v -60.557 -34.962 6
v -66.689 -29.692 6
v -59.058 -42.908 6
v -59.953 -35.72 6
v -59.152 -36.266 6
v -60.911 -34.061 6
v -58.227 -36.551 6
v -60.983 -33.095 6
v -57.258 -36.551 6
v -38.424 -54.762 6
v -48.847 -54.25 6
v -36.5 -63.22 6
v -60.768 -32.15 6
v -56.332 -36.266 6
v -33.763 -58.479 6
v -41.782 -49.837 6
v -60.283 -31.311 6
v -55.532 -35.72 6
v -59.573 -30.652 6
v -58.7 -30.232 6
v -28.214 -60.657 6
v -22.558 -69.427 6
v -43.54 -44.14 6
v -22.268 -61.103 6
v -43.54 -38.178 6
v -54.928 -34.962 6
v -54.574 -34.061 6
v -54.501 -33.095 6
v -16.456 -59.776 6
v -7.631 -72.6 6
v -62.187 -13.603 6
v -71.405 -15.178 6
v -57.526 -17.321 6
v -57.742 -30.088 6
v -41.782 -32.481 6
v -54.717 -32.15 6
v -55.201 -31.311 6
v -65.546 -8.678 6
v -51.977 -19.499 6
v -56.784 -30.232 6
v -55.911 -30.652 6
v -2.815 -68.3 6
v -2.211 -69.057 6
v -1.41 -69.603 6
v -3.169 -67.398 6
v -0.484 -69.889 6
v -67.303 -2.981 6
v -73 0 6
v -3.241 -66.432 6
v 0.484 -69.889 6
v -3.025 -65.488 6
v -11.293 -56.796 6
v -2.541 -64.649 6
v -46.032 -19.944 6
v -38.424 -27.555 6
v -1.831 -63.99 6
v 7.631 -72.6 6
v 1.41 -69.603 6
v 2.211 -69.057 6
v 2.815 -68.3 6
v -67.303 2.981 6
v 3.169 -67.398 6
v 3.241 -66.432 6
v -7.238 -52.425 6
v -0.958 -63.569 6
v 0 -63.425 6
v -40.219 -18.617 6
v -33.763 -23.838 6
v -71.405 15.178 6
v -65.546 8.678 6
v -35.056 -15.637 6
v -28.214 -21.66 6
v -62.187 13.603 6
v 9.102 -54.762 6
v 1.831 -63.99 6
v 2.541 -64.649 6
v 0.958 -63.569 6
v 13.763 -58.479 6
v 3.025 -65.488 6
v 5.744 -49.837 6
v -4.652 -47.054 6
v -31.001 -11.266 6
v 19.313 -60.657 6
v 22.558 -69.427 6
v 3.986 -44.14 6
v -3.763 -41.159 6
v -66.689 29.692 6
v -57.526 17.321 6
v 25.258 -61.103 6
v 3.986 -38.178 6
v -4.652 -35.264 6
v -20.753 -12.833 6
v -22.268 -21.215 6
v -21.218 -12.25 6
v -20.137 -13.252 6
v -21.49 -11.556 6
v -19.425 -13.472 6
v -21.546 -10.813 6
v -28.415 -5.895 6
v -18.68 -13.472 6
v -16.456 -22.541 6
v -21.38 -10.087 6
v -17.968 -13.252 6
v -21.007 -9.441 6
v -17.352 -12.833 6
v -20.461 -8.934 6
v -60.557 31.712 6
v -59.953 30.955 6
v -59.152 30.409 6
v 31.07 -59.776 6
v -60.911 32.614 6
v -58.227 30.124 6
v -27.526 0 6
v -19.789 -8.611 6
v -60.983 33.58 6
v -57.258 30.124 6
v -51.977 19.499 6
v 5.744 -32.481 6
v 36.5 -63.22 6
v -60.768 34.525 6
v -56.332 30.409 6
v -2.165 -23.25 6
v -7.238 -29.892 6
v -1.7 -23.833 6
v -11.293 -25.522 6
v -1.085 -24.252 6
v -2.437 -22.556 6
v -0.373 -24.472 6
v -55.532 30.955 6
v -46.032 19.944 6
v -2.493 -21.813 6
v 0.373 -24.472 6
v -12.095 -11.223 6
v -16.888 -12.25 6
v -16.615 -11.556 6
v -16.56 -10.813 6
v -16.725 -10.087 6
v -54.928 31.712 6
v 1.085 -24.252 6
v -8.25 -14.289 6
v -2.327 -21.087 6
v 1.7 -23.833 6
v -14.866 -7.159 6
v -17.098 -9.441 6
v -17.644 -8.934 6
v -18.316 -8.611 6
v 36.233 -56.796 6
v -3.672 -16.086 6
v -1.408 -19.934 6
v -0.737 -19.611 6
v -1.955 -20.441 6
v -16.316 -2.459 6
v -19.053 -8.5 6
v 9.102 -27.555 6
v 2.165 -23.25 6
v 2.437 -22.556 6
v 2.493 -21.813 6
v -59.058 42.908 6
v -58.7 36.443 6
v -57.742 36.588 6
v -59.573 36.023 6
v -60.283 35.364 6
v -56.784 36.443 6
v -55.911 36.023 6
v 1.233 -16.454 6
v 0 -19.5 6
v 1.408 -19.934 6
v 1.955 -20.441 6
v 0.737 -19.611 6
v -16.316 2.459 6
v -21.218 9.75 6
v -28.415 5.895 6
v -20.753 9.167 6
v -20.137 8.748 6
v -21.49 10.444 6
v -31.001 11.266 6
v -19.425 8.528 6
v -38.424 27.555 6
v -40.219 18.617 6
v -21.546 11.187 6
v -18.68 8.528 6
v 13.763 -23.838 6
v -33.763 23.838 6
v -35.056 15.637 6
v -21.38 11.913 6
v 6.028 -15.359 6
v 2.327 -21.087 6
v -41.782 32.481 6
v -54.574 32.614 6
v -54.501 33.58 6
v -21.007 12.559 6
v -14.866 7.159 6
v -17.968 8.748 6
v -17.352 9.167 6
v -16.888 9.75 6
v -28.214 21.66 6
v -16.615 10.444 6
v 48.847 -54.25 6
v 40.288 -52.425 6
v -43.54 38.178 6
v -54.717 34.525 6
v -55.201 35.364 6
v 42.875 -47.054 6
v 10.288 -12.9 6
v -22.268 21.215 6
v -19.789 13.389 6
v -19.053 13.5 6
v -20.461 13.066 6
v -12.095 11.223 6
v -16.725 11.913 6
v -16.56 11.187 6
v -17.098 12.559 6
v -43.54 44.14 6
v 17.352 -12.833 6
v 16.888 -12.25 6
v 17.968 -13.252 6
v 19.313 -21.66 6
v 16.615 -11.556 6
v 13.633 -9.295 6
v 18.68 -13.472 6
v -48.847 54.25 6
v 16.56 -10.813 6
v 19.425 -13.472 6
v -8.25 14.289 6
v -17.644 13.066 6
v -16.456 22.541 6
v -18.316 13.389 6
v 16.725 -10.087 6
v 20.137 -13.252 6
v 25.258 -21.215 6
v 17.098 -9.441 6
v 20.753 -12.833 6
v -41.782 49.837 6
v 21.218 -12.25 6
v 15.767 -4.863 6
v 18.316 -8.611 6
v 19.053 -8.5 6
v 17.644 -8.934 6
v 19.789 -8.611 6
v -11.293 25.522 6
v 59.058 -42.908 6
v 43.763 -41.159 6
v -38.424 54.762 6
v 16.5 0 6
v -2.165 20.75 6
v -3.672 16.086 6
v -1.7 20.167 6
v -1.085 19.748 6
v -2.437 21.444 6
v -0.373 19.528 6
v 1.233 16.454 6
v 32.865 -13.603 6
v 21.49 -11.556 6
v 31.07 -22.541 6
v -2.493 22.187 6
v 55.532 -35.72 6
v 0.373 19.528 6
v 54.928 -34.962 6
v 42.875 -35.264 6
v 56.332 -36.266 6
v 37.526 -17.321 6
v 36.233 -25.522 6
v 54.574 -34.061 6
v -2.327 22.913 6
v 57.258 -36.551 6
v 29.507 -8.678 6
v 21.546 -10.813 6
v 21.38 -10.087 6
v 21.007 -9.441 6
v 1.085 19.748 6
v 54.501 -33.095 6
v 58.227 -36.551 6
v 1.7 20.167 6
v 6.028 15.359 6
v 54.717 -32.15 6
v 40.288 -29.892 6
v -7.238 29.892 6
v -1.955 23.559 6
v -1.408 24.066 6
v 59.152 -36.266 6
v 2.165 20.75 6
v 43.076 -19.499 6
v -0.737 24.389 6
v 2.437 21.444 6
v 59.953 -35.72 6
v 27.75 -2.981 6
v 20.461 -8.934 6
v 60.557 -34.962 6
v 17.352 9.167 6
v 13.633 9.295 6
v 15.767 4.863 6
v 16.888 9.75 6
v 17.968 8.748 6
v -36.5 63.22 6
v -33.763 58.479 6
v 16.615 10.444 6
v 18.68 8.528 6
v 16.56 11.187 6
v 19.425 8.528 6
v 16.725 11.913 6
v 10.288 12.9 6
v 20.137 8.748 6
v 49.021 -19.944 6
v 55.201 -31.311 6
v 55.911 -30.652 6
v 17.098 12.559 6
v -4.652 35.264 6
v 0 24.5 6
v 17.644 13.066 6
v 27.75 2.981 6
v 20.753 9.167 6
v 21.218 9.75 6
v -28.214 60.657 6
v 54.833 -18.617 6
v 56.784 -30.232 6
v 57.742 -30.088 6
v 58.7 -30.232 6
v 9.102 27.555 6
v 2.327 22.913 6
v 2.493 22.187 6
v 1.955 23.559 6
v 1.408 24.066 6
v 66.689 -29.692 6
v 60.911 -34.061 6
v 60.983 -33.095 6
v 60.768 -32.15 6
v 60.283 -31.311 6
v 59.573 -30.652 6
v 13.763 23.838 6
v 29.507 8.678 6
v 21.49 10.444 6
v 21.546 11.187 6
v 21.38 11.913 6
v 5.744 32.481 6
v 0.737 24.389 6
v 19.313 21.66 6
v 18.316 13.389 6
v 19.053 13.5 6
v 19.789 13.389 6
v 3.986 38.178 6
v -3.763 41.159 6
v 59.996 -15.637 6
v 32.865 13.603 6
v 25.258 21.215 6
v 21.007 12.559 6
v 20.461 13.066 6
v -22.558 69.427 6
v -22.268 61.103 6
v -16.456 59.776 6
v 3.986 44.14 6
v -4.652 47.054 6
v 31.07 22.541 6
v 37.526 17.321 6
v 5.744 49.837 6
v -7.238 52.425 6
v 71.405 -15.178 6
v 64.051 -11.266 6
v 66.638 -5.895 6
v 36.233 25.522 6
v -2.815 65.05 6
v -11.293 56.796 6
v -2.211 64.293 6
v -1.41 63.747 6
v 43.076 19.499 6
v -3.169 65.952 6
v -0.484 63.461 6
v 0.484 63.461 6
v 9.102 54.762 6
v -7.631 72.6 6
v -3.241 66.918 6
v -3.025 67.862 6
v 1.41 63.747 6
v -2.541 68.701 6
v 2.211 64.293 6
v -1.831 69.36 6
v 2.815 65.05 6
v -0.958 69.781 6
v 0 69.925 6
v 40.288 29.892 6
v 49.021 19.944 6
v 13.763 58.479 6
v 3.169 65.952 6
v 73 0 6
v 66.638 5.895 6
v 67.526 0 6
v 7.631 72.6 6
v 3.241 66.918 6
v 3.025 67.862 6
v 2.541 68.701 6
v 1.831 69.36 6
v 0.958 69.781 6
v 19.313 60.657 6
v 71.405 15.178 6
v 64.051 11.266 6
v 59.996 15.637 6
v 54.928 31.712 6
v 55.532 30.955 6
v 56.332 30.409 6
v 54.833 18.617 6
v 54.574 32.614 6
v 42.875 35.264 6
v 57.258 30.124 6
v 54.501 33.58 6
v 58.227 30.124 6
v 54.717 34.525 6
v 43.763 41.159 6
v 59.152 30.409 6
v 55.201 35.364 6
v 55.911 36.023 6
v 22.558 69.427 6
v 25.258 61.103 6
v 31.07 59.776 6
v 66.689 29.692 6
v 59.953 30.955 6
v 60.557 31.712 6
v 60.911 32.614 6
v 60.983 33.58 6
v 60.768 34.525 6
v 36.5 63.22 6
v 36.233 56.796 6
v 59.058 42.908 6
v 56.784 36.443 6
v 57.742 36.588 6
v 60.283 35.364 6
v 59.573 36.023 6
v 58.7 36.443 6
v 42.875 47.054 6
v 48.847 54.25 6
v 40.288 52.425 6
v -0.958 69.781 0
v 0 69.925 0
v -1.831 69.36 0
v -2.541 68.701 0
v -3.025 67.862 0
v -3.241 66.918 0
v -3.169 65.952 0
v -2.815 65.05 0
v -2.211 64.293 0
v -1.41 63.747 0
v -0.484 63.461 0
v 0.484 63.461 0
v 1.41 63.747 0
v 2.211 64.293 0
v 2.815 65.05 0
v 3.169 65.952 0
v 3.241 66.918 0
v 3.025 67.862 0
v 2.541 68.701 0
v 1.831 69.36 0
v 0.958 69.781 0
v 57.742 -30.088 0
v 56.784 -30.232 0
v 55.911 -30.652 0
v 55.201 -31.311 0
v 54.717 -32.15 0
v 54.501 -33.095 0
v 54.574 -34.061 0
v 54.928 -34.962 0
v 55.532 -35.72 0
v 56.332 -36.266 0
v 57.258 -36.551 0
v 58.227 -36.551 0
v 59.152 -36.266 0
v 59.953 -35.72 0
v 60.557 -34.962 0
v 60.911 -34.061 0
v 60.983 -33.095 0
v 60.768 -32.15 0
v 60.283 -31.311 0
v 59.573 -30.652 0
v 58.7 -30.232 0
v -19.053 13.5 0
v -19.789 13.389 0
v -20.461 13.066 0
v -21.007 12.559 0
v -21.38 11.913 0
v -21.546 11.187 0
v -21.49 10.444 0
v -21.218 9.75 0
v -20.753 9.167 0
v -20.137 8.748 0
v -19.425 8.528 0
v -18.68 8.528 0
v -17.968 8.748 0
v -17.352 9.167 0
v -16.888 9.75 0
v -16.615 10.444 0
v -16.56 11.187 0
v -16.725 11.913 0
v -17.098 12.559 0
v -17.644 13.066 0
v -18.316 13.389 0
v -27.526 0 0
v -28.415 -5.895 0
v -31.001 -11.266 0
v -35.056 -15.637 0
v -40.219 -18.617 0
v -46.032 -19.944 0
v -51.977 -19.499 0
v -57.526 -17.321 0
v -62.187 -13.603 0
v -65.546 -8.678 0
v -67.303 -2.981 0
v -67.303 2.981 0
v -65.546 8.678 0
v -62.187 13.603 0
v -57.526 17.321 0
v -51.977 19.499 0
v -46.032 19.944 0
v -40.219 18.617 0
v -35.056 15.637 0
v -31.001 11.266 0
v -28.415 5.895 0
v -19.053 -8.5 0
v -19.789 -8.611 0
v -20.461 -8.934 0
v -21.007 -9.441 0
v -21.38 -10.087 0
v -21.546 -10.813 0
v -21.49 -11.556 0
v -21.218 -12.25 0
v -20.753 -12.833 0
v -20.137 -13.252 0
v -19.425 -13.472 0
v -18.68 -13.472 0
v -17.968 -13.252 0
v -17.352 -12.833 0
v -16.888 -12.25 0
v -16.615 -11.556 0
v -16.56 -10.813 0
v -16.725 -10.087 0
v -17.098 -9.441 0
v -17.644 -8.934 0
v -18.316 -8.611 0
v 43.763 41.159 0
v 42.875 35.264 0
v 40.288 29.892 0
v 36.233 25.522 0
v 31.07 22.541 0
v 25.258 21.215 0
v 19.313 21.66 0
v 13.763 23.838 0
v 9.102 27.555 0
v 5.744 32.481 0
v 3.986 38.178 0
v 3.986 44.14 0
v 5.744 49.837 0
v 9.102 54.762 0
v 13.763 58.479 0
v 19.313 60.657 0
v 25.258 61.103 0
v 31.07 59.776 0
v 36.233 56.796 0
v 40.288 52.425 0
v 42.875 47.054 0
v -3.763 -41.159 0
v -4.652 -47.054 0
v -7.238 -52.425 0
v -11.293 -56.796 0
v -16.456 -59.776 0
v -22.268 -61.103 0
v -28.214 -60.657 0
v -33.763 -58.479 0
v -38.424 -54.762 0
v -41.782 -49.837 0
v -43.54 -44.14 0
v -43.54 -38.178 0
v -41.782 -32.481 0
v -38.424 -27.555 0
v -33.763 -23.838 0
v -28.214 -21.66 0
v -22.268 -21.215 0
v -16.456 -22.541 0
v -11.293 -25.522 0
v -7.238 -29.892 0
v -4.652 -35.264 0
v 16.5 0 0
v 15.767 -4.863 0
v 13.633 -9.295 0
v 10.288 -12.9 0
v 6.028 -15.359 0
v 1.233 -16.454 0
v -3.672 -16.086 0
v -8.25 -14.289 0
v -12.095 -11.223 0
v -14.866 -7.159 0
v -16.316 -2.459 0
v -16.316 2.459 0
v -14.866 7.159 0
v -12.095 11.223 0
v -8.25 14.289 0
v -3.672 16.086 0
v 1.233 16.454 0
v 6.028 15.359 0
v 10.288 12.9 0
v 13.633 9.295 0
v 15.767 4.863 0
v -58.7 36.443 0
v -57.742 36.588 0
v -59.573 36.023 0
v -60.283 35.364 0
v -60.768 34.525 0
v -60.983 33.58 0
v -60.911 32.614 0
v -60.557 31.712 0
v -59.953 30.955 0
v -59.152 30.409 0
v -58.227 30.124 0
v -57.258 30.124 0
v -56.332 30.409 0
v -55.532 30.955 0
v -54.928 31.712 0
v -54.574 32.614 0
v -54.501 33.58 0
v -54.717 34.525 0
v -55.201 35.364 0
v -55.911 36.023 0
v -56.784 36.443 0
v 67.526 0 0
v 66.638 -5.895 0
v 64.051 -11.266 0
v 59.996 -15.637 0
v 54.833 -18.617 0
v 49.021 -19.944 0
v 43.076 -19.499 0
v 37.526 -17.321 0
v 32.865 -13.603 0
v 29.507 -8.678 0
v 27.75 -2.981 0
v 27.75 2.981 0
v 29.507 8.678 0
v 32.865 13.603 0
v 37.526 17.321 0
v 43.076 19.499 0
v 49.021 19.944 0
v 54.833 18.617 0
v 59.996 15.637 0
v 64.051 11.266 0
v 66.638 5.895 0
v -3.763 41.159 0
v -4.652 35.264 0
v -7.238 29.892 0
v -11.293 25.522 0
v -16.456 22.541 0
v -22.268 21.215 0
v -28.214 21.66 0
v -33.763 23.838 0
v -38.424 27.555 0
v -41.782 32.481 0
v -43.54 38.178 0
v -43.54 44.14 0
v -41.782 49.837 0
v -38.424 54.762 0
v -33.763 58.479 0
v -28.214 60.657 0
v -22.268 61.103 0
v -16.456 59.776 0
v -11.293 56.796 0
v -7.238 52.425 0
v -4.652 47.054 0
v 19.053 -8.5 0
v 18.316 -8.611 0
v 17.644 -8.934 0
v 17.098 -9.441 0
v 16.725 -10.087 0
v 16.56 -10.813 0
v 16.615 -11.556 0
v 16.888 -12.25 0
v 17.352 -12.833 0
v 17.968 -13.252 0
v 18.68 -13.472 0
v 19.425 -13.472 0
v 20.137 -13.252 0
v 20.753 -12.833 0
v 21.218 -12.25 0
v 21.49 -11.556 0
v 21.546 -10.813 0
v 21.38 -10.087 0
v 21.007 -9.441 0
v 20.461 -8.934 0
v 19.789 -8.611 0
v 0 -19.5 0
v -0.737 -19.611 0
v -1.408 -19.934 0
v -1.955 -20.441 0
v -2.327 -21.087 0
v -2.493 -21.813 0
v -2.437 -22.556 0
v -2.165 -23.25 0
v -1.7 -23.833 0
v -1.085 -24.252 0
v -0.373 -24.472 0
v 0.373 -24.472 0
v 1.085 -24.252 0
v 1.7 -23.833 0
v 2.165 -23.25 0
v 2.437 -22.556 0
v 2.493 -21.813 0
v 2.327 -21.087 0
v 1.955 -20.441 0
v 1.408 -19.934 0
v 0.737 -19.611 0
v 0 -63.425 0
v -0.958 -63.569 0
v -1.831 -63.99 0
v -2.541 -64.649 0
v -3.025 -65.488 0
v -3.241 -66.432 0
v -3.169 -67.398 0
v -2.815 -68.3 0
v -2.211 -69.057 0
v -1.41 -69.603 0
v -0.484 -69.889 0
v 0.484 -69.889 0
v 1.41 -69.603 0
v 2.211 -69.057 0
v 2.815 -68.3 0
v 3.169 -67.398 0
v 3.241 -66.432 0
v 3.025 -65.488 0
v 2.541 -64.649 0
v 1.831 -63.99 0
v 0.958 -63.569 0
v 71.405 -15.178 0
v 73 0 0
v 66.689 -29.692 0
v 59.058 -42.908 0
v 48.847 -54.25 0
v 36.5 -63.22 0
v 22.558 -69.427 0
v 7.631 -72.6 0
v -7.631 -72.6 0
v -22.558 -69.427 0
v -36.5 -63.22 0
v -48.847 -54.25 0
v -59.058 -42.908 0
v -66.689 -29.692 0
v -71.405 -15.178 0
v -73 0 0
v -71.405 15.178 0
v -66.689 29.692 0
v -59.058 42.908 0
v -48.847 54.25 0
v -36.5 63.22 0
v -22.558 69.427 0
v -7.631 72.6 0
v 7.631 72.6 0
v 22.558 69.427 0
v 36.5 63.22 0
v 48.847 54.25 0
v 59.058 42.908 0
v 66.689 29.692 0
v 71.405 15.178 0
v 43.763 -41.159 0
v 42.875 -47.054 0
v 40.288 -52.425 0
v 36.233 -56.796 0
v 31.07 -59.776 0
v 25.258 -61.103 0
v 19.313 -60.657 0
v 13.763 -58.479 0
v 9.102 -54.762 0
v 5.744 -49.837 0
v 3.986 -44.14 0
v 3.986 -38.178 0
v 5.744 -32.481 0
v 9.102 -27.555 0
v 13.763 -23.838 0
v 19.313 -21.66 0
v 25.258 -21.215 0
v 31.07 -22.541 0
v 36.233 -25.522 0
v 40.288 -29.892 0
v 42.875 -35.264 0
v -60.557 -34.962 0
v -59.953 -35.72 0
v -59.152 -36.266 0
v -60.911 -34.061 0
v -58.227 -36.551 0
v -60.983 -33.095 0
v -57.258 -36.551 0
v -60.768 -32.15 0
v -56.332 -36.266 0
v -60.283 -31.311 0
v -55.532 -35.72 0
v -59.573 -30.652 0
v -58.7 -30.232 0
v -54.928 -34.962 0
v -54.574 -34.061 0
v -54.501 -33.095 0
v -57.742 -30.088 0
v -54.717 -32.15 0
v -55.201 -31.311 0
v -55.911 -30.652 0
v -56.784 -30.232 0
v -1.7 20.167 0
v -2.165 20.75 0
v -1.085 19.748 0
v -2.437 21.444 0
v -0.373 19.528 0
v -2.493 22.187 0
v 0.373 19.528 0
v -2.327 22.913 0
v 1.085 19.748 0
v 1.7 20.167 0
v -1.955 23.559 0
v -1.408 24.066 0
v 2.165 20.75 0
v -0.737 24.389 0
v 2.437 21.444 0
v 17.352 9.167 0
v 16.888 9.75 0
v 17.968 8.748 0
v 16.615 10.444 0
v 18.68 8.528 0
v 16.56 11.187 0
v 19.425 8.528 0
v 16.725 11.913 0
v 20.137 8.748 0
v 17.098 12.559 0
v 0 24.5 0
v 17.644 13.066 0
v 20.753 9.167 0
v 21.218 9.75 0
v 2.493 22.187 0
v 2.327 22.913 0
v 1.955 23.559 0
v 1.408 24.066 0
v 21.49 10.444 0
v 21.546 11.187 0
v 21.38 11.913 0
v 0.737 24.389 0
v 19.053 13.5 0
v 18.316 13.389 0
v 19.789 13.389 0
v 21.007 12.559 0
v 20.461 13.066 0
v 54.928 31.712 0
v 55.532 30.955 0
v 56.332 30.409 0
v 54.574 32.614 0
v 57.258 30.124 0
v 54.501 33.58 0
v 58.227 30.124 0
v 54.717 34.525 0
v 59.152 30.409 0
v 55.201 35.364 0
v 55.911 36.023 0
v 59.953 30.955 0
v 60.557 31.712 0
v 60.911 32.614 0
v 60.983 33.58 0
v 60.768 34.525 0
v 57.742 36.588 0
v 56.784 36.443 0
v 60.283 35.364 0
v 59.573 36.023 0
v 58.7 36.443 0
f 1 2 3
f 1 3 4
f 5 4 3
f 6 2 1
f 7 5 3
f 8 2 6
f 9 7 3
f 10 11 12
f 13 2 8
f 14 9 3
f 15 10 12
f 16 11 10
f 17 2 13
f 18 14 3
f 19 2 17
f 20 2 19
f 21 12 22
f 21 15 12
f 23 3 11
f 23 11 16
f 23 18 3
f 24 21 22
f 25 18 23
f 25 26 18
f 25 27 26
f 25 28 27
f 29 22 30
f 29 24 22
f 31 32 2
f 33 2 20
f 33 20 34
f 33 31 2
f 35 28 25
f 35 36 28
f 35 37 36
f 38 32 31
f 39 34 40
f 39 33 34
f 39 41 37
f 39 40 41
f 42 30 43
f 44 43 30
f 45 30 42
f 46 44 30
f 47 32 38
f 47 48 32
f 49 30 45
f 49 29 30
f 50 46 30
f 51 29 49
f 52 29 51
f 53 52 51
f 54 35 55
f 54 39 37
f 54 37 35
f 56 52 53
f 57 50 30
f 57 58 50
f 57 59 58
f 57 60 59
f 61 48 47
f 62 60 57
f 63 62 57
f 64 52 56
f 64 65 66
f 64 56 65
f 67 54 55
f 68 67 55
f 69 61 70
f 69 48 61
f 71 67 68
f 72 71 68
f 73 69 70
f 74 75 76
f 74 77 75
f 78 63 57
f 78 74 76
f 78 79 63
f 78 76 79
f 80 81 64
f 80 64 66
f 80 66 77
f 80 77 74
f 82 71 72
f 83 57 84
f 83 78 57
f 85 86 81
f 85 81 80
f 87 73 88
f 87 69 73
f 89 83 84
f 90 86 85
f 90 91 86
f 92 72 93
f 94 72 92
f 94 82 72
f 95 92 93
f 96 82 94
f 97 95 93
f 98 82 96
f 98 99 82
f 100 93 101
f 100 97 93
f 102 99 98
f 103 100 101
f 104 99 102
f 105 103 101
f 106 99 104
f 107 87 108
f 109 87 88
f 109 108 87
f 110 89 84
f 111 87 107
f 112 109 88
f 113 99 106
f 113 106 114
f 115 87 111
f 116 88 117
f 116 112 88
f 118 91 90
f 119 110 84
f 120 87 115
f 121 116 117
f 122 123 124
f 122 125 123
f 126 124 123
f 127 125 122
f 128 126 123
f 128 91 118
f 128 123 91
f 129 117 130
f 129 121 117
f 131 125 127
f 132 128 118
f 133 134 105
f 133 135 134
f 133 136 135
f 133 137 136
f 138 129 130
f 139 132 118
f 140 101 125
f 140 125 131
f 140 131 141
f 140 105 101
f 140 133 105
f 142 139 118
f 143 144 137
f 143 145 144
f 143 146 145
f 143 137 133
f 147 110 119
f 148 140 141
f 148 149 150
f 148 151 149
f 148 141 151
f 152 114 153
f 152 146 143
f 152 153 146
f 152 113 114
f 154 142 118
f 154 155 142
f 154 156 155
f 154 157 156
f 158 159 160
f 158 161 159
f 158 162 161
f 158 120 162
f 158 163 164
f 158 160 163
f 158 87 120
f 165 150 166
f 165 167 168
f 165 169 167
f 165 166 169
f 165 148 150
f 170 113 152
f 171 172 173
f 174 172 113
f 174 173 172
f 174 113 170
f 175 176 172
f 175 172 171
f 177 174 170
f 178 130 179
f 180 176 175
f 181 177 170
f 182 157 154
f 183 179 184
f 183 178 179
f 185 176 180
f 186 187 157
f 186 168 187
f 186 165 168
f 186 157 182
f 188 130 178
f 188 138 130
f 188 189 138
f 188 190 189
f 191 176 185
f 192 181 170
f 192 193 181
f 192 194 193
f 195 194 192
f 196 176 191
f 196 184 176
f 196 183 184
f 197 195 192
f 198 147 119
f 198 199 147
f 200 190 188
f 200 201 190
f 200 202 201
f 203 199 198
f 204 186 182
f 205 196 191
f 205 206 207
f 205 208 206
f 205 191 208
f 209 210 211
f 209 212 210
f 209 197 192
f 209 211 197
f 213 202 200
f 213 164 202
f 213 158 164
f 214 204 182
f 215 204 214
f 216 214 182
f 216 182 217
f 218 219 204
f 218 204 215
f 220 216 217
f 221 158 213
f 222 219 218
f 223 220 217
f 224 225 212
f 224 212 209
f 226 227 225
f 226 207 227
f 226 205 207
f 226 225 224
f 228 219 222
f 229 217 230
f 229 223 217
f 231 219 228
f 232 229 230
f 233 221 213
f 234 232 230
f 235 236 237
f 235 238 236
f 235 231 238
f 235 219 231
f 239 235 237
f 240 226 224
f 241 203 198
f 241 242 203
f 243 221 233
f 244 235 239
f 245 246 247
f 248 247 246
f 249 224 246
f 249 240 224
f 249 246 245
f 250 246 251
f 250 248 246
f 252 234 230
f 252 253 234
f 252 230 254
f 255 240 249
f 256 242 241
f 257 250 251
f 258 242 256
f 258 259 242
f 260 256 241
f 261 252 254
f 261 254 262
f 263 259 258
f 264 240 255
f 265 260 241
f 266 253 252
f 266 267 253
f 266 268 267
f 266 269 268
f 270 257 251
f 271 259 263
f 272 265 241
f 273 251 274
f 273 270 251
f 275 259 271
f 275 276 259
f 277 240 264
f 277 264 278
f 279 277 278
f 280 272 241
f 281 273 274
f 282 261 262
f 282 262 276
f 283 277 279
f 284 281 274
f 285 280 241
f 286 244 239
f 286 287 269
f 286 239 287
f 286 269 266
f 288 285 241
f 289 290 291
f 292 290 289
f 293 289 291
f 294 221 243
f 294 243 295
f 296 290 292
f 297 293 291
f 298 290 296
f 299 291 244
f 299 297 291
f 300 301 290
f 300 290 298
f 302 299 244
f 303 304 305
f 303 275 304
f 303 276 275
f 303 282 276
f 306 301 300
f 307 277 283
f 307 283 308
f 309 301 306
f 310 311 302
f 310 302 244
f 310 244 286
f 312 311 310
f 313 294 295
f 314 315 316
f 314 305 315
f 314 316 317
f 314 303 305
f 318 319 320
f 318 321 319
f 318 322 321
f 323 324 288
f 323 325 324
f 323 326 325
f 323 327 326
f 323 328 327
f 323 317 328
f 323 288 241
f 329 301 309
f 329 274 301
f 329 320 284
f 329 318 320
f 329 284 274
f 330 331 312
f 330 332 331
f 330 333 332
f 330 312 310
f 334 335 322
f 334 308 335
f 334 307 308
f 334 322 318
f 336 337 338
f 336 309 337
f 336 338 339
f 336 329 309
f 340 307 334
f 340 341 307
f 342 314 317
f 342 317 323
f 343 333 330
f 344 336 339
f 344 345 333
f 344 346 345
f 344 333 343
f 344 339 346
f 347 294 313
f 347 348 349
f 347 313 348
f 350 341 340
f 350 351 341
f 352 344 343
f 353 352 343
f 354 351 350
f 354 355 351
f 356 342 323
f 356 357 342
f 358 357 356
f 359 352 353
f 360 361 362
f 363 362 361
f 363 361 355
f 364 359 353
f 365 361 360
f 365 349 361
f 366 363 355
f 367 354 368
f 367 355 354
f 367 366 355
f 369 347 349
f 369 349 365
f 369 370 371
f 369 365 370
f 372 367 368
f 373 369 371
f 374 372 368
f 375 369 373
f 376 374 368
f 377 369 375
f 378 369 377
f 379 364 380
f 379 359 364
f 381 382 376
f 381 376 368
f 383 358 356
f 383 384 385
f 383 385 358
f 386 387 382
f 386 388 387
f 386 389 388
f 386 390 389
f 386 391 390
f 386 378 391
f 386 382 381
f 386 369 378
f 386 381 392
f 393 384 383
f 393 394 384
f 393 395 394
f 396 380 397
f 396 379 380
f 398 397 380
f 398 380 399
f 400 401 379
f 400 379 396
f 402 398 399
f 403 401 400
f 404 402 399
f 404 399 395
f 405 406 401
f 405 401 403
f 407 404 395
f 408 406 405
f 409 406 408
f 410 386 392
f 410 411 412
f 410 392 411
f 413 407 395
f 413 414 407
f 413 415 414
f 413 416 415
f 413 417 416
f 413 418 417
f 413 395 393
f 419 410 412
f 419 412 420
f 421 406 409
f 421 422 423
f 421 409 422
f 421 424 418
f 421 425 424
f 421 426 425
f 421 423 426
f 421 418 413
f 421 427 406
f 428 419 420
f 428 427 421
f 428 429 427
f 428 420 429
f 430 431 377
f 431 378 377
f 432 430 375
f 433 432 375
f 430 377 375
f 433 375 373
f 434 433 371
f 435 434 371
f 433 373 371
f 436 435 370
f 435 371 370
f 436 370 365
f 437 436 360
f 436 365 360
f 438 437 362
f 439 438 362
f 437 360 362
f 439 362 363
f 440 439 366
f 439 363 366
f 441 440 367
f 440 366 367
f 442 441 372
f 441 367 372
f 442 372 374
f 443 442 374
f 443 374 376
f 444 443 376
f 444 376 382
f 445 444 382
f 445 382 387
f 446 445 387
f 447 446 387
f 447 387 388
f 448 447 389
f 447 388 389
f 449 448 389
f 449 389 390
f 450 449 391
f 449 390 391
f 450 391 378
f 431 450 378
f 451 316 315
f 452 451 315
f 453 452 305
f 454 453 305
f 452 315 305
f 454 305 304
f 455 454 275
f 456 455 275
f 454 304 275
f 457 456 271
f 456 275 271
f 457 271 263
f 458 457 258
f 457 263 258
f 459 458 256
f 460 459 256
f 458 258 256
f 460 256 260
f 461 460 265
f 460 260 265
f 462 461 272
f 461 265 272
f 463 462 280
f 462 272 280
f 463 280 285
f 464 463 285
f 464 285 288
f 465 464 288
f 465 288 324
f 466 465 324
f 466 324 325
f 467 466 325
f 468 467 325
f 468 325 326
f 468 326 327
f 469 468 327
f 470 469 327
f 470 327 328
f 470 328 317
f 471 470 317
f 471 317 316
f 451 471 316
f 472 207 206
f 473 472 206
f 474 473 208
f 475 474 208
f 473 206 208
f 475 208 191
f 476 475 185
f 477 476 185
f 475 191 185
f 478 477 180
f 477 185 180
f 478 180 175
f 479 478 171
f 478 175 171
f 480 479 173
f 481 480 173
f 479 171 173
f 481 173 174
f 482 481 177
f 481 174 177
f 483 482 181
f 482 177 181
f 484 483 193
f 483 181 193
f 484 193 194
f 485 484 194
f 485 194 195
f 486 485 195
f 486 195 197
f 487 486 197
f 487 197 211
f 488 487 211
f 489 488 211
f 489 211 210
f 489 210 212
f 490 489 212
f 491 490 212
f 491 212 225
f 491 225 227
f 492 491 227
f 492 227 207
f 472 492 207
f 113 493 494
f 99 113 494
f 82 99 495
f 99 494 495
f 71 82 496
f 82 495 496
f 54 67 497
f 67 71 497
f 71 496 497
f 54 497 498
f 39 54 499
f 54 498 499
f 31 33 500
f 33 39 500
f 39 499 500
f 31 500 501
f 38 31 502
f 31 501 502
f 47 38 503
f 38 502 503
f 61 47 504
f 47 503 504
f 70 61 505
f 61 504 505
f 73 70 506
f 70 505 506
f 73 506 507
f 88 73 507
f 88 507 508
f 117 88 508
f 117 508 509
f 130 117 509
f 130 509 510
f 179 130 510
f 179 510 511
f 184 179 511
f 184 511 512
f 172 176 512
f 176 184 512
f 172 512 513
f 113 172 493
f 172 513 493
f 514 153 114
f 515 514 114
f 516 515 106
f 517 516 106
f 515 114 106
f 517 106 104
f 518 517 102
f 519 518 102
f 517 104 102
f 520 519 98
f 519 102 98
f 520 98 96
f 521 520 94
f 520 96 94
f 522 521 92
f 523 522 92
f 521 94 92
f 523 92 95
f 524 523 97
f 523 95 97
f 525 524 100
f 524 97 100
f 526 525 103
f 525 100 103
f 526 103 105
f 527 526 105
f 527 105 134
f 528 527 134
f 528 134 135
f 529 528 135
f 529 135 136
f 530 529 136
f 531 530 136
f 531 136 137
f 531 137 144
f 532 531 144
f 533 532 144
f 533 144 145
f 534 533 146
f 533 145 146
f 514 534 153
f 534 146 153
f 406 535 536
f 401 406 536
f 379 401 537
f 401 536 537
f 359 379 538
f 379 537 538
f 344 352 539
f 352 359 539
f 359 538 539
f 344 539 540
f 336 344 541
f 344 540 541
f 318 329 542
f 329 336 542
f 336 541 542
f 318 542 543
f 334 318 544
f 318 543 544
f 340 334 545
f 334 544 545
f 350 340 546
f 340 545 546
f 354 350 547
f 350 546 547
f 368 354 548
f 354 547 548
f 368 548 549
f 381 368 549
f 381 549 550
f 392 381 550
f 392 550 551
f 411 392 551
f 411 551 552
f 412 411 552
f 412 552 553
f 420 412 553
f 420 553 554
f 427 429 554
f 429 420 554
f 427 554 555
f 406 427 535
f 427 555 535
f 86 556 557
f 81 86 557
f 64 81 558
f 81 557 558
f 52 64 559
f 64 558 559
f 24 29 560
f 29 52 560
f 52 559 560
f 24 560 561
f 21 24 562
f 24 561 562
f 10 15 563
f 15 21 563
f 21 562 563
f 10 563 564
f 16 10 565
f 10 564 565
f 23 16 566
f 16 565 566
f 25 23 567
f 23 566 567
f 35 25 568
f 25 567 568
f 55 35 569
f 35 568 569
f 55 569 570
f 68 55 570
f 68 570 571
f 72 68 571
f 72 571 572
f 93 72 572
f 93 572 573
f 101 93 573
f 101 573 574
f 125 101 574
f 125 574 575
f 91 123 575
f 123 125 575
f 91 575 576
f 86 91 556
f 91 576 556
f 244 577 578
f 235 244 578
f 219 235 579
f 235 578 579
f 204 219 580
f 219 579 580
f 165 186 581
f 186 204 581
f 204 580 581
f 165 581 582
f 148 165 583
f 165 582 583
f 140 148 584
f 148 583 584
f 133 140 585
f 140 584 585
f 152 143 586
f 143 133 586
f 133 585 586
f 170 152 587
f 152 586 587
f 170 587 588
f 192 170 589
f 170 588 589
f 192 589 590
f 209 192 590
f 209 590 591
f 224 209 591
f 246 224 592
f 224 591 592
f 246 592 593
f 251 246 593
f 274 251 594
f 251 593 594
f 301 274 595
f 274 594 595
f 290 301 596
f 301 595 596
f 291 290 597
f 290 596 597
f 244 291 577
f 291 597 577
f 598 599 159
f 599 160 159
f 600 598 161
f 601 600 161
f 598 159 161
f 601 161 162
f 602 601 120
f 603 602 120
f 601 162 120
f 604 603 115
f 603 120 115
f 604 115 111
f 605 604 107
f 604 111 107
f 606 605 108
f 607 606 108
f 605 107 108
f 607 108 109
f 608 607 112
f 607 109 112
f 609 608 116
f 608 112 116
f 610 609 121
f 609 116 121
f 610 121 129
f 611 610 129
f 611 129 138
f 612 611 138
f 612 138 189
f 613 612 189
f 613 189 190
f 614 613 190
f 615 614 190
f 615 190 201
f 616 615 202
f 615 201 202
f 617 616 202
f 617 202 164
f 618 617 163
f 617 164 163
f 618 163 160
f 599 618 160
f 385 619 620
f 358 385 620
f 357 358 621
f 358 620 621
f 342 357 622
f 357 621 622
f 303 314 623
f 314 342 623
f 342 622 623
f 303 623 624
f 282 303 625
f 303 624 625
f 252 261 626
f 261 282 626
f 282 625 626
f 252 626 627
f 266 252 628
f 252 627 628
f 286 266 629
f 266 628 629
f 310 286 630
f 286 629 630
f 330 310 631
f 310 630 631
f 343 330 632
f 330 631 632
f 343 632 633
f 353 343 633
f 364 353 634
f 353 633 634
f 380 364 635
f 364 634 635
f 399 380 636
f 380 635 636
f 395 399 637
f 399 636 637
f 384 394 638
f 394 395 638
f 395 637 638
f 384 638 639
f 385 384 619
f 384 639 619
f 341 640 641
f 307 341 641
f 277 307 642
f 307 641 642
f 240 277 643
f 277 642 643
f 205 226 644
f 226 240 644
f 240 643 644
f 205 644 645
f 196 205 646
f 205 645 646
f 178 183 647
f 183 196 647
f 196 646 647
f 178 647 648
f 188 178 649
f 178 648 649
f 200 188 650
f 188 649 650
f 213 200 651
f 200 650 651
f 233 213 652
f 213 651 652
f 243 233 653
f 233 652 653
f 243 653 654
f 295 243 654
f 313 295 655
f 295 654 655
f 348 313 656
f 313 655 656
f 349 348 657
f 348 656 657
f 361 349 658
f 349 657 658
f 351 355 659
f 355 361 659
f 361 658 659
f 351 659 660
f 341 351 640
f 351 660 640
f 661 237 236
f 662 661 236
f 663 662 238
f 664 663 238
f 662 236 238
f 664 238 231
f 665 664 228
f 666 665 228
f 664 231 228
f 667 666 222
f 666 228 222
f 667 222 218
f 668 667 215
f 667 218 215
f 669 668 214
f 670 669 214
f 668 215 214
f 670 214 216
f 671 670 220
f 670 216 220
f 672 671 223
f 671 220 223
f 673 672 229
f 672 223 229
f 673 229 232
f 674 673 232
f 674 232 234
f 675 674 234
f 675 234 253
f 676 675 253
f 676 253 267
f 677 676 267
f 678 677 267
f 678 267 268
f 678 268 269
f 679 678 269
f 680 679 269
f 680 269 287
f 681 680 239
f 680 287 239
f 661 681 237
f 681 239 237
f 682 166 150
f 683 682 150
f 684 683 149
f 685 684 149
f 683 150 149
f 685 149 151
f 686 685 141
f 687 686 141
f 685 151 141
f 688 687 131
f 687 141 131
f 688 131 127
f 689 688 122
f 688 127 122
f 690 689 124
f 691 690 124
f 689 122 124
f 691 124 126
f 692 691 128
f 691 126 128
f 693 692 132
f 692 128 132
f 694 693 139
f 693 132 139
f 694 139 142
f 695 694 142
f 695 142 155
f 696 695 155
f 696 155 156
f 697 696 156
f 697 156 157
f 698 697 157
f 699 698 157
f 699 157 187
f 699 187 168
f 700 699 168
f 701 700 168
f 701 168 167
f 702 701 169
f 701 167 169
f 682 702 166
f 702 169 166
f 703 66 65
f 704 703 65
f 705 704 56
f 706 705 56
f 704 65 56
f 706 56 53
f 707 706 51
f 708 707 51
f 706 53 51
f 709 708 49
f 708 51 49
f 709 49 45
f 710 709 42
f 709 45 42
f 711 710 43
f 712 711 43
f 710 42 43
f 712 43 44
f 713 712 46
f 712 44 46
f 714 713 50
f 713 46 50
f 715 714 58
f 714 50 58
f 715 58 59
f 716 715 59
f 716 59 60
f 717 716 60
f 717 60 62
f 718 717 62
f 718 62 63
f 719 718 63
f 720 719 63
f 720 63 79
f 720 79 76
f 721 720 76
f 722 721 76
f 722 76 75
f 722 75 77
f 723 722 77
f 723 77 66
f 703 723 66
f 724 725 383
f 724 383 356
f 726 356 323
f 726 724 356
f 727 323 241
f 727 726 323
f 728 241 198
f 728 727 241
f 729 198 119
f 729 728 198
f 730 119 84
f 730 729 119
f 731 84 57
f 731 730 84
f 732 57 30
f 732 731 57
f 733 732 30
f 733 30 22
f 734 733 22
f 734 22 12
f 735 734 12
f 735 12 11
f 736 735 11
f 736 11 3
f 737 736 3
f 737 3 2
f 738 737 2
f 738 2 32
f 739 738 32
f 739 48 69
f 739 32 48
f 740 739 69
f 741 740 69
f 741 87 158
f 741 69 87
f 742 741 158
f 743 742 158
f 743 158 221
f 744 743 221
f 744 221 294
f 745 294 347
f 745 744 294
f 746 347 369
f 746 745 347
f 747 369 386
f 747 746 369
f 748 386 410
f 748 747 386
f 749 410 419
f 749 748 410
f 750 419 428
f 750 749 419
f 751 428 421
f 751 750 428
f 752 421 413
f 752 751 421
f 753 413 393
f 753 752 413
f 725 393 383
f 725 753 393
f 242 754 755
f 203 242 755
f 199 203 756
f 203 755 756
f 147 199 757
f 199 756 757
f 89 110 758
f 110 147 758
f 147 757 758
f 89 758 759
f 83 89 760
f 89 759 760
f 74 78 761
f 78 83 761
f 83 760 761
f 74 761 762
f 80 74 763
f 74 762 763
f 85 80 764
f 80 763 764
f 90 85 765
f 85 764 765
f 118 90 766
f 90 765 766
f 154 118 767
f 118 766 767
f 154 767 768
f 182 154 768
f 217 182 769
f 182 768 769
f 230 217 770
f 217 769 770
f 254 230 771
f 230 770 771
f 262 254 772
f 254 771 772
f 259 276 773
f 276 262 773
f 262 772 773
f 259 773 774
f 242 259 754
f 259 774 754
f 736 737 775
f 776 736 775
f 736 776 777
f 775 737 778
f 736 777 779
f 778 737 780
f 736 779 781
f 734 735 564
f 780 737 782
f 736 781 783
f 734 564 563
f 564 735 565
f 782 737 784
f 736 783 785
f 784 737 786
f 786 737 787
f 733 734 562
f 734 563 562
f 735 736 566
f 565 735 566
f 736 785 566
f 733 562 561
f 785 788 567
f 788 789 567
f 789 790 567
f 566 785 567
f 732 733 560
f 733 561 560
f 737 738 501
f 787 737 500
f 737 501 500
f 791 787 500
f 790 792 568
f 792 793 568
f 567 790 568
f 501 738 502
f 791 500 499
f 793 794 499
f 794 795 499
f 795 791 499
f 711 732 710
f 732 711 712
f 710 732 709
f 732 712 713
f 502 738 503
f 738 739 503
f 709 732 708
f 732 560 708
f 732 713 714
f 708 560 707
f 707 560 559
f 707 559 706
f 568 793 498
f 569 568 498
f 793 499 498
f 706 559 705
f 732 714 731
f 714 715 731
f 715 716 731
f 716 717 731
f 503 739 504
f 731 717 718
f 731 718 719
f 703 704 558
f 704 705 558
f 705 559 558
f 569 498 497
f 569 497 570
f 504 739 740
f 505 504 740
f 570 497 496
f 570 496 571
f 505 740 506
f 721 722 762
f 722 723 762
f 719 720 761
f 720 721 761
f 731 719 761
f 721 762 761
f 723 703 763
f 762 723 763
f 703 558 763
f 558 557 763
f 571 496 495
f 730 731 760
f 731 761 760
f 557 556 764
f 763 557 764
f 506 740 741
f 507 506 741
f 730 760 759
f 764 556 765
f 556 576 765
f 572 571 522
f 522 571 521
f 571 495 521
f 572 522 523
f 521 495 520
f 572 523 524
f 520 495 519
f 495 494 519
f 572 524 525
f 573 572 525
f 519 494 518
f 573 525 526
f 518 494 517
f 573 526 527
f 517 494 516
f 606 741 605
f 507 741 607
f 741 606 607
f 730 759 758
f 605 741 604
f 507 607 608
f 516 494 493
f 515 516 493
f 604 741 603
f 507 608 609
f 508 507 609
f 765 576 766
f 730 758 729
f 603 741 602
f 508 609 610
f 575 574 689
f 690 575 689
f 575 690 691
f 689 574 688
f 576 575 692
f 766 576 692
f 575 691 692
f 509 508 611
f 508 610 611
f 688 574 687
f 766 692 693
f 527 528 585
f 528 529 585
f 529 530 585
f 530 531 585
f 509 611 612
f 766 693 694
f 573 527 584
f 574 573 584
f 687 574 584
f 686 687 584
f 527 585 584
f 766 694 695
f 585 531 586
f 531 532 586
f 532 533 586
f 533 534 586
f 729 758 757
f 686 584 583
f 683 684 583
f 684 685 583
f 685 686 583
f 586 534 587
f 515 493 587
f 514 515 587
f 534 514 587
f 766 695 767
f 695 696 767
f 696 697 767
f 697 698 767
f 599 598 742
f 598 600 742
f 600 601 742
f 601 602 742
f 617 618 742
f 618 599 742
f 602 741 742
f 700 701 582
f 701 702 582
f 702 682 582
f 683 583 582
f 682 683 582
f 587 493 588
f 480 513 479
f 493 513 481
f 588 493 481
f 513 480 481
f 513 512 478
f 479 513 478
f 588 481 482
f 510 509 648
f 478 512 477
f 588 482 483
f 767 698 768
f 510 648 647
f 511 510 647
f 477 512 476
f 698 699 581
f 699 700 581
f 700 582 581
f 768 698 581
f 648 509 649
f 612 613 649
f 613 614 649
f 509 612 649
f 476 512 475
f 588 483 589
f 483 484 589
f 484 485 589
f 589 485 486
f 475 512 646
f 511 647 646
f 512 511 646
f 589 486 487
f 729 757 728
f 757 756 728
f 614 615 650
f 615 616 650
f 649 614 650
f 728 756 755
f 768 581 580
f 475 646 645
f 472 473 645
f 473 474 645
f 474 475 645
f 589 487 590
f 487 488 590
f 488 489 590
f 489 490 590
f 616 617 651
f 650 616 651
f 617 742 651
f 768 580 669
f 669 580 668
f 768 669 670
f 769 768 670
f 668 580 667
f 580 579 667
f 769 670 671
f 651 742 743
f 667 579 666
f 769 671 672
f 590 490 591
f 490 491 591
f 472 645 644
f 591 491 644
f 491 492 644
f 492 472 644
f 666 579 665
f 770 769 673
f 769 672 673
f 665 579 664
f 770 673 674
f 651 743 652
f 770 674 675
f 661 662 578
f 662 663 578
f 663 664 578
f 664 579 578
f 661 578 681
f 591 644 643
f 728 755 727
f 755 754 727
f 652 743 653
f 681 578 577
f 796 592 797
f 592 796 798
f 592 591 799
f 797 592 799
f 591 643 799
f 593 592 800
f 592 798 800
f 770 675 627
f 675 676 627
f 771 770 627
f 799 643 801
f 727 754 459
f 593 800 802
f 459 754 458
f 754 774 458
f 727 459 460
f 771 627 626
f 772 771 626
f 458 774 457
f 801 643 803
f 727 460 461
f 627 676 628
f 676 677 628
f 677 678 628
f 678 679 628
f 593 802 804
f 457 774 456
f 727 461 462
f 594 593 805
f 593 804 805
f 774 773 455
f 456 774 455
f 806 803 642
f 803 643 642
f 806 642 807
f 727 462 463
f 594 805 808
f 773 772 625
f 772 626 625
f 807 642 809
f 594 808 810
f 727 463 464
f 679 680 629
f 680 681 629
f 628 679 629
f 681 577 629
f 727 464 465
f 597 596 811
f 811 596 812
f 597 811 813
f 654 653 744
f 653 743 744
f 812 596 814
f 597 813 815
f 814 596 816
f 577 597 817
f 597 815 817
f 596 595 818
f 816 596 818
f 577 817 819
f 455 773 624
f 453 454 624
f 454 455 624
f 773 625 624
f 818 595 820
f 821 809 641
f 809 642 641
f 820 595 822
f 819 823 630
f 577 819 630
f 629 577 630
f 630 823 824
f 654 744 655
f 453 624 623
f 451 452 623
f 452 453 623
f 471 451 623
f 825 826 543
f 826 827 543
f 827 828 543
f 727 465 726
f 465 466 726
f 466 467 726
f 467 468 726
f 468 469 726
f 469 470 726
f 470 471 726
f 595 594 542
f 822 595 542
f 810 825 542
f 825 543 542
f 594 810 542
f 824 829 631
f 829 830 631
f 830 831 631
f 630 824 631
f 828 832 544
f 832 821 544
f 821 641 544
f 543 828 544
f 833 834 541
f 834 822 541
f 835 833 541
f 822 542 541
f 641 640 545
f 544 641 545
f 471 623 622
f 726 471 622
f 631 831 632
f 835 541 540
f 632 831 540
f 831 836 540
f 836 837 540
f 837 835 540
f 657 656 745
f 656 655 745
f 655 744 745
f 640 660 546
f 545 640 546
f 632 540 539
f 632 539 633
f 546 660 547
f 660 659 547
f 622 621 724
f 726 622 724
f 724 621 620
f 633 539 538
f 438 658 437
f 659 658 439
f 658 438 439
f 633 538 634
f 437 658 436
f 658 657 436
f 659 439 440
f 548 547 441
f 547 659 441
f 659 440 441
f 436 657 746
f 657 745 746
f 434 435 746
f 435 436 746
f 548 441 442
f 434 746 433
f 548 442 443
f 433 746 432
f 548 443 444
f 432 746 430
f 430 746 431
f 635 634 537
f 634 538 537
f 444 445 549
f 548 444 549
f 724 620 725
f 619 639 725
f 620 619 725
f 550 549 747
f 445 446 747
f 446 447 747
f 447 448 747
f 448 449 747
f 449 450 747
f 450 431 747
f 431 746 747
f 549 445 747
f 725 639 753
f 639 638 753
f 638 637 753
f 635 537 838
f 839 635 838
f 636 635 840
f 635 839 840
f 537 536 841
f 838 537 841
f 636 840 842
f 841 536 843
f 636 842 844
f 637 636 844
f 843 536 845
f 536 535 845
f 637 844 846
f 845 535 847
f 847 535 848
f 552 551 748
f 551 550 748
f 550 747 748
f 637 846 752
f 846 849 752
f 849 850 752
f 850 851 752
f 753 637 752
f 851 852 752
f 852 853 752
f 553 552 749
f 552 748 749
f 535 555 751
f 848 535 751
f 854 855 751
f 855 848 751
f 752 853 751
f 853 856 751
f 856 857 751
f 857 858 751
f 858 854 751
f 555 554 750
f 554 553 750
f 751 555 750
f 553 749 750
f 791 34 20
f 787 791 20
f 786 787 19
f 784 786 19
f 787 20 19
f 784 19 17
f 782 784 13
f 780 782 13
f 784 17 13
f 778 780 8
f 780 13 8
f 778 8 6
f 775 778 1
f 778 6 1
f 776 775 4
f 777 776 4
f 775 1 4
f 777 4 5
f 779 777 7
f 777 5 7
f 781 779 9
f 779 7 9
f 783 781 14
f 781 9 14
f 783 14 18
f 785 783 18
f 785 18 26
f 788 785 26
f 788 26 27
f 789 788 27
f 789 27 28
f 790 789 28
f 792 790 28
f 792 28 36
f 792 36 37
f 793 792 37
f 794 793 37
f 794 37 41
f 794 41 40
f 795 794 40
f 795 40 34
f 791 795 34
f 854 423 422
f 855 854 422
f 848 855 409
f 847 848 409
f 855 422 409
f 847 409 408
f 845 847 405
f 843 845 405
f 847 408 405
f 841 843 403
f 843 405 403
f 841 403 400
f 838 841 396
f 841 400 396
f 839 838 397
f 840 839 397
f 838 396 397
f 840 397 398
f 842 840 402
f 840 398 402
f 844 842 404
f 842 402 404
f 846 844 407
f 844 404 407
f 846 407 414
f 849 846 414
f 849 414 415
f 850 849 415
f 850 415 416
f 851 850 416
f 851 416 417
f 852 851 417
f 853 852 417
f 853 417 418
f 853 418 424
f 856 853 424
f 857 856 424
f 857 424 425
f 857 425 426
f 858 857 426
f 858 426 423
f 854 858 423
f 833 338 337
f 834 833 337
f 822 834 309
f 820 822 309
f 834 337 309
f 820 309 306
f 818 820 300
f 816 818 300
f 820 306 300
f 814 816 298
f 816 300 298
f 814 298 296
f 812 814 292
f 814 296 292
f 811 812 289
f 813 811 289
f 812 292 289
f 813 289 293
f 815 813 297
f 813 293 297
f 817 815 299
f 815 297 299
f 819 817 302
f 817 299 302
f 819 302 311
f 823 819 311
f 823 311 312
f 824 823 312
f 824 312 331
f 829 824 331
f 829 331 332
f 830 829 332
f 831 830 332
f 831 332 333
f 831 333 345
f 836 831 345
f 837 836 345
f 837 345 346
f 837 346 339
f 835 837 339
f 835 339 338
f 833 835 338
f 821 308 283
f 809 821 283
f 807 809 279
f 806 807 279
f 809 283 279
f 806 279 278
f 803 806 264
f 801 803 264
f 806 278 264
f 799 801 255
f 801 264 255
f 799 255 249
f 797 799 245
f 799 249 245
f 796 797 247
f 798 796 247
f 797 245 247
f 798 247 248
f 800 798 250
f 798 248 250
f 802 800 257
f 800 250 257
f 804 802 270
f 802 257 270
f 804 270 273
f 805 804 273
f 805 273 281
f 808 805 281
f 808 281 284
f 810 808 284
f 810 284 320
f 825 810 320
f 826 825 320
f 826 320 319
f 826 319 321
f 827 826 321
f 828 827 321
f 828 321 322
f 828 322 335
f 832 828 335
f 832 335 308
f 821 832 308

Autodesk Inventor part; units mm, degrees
ref_plane "YZ Plane" through (0, 0, 0) normal (1, 0, 0) x (0, 1, 0)
ref_plane "XZ Plane" through (0, 0, 0) normal (0, 1, 0) x (-1, 0, 0)
ref_plane "XY Plane" through (0, 0, 0) normal (0, 0, 1) x (1, 0, 0)
sketch "Sketch1" plane through (0, 0, 0) normal (0, 0, 1) x (1, 0, 0)
  circle A0 centre (0, 0) radius 16.5
  circle A1 centre (-47.5262, 0) radius 20
  circle A2 centre (0, 0) radius 73
  circle A3 centre (-23.7631, -41.1589) radius 20
  circle A4 centre (23.7631, -41.1589) radius 20
  circle A5 centre (47.5262, 0) radius 20
  circle A6 centre (23.7631, 41.1589) radius 20
  circle A7 centre (-23.7631, 41.1589) radius 20
  point P0 (0, 66.675)
  point P1 (-57.7422, 33.3375)
  point P2 (-57.7422, -33.3375)
  point P3 (0, -66.675)
  point P4 (57.7422, -33.3375)
  point P5 (57.7422, 33.3375)
  point P6 (0, 22)
  point P7 (-19.0526, 11)
  point P8 (-19.0526, -11)
  point P9 (0, -22)
  point P10 (19.0526, -11)
  point P11 (19.0526, 11)
  dimension "d0" = 66.675
  dimension "d3" = 360
  dimension "d9" = 33
  dimension "d19" = 40
  dimension "d20" = 22
  dimension "d23" = 360
  dimension "d25" = 146
  dimension "d28" = 360
extrude "Extrusion2" add sketch "Sketch1" along normal blind 6
hole "Hole2" at (0, 66.675, 0) at (-57.7422, 33.3375, 0) at (-57.7422, -33.3375, 0) at (0, -66.675, 0) at (57.7422, -33.3375, 0) at (57.7422, 33.3375, 0) direction (0, 0, 1) diameter 6.5 end through all
hole "Hole3" at (0, 22, 0) at (-19.0526, 11, 0) at (-19.0526, -11, 0) at (0, -22, 0) at (19.0526, 11, 0) at (19.0526, -11, 0) direction (0, 0, 1) diameter 5 end through all
properties part number "SprocketHubPlate"
